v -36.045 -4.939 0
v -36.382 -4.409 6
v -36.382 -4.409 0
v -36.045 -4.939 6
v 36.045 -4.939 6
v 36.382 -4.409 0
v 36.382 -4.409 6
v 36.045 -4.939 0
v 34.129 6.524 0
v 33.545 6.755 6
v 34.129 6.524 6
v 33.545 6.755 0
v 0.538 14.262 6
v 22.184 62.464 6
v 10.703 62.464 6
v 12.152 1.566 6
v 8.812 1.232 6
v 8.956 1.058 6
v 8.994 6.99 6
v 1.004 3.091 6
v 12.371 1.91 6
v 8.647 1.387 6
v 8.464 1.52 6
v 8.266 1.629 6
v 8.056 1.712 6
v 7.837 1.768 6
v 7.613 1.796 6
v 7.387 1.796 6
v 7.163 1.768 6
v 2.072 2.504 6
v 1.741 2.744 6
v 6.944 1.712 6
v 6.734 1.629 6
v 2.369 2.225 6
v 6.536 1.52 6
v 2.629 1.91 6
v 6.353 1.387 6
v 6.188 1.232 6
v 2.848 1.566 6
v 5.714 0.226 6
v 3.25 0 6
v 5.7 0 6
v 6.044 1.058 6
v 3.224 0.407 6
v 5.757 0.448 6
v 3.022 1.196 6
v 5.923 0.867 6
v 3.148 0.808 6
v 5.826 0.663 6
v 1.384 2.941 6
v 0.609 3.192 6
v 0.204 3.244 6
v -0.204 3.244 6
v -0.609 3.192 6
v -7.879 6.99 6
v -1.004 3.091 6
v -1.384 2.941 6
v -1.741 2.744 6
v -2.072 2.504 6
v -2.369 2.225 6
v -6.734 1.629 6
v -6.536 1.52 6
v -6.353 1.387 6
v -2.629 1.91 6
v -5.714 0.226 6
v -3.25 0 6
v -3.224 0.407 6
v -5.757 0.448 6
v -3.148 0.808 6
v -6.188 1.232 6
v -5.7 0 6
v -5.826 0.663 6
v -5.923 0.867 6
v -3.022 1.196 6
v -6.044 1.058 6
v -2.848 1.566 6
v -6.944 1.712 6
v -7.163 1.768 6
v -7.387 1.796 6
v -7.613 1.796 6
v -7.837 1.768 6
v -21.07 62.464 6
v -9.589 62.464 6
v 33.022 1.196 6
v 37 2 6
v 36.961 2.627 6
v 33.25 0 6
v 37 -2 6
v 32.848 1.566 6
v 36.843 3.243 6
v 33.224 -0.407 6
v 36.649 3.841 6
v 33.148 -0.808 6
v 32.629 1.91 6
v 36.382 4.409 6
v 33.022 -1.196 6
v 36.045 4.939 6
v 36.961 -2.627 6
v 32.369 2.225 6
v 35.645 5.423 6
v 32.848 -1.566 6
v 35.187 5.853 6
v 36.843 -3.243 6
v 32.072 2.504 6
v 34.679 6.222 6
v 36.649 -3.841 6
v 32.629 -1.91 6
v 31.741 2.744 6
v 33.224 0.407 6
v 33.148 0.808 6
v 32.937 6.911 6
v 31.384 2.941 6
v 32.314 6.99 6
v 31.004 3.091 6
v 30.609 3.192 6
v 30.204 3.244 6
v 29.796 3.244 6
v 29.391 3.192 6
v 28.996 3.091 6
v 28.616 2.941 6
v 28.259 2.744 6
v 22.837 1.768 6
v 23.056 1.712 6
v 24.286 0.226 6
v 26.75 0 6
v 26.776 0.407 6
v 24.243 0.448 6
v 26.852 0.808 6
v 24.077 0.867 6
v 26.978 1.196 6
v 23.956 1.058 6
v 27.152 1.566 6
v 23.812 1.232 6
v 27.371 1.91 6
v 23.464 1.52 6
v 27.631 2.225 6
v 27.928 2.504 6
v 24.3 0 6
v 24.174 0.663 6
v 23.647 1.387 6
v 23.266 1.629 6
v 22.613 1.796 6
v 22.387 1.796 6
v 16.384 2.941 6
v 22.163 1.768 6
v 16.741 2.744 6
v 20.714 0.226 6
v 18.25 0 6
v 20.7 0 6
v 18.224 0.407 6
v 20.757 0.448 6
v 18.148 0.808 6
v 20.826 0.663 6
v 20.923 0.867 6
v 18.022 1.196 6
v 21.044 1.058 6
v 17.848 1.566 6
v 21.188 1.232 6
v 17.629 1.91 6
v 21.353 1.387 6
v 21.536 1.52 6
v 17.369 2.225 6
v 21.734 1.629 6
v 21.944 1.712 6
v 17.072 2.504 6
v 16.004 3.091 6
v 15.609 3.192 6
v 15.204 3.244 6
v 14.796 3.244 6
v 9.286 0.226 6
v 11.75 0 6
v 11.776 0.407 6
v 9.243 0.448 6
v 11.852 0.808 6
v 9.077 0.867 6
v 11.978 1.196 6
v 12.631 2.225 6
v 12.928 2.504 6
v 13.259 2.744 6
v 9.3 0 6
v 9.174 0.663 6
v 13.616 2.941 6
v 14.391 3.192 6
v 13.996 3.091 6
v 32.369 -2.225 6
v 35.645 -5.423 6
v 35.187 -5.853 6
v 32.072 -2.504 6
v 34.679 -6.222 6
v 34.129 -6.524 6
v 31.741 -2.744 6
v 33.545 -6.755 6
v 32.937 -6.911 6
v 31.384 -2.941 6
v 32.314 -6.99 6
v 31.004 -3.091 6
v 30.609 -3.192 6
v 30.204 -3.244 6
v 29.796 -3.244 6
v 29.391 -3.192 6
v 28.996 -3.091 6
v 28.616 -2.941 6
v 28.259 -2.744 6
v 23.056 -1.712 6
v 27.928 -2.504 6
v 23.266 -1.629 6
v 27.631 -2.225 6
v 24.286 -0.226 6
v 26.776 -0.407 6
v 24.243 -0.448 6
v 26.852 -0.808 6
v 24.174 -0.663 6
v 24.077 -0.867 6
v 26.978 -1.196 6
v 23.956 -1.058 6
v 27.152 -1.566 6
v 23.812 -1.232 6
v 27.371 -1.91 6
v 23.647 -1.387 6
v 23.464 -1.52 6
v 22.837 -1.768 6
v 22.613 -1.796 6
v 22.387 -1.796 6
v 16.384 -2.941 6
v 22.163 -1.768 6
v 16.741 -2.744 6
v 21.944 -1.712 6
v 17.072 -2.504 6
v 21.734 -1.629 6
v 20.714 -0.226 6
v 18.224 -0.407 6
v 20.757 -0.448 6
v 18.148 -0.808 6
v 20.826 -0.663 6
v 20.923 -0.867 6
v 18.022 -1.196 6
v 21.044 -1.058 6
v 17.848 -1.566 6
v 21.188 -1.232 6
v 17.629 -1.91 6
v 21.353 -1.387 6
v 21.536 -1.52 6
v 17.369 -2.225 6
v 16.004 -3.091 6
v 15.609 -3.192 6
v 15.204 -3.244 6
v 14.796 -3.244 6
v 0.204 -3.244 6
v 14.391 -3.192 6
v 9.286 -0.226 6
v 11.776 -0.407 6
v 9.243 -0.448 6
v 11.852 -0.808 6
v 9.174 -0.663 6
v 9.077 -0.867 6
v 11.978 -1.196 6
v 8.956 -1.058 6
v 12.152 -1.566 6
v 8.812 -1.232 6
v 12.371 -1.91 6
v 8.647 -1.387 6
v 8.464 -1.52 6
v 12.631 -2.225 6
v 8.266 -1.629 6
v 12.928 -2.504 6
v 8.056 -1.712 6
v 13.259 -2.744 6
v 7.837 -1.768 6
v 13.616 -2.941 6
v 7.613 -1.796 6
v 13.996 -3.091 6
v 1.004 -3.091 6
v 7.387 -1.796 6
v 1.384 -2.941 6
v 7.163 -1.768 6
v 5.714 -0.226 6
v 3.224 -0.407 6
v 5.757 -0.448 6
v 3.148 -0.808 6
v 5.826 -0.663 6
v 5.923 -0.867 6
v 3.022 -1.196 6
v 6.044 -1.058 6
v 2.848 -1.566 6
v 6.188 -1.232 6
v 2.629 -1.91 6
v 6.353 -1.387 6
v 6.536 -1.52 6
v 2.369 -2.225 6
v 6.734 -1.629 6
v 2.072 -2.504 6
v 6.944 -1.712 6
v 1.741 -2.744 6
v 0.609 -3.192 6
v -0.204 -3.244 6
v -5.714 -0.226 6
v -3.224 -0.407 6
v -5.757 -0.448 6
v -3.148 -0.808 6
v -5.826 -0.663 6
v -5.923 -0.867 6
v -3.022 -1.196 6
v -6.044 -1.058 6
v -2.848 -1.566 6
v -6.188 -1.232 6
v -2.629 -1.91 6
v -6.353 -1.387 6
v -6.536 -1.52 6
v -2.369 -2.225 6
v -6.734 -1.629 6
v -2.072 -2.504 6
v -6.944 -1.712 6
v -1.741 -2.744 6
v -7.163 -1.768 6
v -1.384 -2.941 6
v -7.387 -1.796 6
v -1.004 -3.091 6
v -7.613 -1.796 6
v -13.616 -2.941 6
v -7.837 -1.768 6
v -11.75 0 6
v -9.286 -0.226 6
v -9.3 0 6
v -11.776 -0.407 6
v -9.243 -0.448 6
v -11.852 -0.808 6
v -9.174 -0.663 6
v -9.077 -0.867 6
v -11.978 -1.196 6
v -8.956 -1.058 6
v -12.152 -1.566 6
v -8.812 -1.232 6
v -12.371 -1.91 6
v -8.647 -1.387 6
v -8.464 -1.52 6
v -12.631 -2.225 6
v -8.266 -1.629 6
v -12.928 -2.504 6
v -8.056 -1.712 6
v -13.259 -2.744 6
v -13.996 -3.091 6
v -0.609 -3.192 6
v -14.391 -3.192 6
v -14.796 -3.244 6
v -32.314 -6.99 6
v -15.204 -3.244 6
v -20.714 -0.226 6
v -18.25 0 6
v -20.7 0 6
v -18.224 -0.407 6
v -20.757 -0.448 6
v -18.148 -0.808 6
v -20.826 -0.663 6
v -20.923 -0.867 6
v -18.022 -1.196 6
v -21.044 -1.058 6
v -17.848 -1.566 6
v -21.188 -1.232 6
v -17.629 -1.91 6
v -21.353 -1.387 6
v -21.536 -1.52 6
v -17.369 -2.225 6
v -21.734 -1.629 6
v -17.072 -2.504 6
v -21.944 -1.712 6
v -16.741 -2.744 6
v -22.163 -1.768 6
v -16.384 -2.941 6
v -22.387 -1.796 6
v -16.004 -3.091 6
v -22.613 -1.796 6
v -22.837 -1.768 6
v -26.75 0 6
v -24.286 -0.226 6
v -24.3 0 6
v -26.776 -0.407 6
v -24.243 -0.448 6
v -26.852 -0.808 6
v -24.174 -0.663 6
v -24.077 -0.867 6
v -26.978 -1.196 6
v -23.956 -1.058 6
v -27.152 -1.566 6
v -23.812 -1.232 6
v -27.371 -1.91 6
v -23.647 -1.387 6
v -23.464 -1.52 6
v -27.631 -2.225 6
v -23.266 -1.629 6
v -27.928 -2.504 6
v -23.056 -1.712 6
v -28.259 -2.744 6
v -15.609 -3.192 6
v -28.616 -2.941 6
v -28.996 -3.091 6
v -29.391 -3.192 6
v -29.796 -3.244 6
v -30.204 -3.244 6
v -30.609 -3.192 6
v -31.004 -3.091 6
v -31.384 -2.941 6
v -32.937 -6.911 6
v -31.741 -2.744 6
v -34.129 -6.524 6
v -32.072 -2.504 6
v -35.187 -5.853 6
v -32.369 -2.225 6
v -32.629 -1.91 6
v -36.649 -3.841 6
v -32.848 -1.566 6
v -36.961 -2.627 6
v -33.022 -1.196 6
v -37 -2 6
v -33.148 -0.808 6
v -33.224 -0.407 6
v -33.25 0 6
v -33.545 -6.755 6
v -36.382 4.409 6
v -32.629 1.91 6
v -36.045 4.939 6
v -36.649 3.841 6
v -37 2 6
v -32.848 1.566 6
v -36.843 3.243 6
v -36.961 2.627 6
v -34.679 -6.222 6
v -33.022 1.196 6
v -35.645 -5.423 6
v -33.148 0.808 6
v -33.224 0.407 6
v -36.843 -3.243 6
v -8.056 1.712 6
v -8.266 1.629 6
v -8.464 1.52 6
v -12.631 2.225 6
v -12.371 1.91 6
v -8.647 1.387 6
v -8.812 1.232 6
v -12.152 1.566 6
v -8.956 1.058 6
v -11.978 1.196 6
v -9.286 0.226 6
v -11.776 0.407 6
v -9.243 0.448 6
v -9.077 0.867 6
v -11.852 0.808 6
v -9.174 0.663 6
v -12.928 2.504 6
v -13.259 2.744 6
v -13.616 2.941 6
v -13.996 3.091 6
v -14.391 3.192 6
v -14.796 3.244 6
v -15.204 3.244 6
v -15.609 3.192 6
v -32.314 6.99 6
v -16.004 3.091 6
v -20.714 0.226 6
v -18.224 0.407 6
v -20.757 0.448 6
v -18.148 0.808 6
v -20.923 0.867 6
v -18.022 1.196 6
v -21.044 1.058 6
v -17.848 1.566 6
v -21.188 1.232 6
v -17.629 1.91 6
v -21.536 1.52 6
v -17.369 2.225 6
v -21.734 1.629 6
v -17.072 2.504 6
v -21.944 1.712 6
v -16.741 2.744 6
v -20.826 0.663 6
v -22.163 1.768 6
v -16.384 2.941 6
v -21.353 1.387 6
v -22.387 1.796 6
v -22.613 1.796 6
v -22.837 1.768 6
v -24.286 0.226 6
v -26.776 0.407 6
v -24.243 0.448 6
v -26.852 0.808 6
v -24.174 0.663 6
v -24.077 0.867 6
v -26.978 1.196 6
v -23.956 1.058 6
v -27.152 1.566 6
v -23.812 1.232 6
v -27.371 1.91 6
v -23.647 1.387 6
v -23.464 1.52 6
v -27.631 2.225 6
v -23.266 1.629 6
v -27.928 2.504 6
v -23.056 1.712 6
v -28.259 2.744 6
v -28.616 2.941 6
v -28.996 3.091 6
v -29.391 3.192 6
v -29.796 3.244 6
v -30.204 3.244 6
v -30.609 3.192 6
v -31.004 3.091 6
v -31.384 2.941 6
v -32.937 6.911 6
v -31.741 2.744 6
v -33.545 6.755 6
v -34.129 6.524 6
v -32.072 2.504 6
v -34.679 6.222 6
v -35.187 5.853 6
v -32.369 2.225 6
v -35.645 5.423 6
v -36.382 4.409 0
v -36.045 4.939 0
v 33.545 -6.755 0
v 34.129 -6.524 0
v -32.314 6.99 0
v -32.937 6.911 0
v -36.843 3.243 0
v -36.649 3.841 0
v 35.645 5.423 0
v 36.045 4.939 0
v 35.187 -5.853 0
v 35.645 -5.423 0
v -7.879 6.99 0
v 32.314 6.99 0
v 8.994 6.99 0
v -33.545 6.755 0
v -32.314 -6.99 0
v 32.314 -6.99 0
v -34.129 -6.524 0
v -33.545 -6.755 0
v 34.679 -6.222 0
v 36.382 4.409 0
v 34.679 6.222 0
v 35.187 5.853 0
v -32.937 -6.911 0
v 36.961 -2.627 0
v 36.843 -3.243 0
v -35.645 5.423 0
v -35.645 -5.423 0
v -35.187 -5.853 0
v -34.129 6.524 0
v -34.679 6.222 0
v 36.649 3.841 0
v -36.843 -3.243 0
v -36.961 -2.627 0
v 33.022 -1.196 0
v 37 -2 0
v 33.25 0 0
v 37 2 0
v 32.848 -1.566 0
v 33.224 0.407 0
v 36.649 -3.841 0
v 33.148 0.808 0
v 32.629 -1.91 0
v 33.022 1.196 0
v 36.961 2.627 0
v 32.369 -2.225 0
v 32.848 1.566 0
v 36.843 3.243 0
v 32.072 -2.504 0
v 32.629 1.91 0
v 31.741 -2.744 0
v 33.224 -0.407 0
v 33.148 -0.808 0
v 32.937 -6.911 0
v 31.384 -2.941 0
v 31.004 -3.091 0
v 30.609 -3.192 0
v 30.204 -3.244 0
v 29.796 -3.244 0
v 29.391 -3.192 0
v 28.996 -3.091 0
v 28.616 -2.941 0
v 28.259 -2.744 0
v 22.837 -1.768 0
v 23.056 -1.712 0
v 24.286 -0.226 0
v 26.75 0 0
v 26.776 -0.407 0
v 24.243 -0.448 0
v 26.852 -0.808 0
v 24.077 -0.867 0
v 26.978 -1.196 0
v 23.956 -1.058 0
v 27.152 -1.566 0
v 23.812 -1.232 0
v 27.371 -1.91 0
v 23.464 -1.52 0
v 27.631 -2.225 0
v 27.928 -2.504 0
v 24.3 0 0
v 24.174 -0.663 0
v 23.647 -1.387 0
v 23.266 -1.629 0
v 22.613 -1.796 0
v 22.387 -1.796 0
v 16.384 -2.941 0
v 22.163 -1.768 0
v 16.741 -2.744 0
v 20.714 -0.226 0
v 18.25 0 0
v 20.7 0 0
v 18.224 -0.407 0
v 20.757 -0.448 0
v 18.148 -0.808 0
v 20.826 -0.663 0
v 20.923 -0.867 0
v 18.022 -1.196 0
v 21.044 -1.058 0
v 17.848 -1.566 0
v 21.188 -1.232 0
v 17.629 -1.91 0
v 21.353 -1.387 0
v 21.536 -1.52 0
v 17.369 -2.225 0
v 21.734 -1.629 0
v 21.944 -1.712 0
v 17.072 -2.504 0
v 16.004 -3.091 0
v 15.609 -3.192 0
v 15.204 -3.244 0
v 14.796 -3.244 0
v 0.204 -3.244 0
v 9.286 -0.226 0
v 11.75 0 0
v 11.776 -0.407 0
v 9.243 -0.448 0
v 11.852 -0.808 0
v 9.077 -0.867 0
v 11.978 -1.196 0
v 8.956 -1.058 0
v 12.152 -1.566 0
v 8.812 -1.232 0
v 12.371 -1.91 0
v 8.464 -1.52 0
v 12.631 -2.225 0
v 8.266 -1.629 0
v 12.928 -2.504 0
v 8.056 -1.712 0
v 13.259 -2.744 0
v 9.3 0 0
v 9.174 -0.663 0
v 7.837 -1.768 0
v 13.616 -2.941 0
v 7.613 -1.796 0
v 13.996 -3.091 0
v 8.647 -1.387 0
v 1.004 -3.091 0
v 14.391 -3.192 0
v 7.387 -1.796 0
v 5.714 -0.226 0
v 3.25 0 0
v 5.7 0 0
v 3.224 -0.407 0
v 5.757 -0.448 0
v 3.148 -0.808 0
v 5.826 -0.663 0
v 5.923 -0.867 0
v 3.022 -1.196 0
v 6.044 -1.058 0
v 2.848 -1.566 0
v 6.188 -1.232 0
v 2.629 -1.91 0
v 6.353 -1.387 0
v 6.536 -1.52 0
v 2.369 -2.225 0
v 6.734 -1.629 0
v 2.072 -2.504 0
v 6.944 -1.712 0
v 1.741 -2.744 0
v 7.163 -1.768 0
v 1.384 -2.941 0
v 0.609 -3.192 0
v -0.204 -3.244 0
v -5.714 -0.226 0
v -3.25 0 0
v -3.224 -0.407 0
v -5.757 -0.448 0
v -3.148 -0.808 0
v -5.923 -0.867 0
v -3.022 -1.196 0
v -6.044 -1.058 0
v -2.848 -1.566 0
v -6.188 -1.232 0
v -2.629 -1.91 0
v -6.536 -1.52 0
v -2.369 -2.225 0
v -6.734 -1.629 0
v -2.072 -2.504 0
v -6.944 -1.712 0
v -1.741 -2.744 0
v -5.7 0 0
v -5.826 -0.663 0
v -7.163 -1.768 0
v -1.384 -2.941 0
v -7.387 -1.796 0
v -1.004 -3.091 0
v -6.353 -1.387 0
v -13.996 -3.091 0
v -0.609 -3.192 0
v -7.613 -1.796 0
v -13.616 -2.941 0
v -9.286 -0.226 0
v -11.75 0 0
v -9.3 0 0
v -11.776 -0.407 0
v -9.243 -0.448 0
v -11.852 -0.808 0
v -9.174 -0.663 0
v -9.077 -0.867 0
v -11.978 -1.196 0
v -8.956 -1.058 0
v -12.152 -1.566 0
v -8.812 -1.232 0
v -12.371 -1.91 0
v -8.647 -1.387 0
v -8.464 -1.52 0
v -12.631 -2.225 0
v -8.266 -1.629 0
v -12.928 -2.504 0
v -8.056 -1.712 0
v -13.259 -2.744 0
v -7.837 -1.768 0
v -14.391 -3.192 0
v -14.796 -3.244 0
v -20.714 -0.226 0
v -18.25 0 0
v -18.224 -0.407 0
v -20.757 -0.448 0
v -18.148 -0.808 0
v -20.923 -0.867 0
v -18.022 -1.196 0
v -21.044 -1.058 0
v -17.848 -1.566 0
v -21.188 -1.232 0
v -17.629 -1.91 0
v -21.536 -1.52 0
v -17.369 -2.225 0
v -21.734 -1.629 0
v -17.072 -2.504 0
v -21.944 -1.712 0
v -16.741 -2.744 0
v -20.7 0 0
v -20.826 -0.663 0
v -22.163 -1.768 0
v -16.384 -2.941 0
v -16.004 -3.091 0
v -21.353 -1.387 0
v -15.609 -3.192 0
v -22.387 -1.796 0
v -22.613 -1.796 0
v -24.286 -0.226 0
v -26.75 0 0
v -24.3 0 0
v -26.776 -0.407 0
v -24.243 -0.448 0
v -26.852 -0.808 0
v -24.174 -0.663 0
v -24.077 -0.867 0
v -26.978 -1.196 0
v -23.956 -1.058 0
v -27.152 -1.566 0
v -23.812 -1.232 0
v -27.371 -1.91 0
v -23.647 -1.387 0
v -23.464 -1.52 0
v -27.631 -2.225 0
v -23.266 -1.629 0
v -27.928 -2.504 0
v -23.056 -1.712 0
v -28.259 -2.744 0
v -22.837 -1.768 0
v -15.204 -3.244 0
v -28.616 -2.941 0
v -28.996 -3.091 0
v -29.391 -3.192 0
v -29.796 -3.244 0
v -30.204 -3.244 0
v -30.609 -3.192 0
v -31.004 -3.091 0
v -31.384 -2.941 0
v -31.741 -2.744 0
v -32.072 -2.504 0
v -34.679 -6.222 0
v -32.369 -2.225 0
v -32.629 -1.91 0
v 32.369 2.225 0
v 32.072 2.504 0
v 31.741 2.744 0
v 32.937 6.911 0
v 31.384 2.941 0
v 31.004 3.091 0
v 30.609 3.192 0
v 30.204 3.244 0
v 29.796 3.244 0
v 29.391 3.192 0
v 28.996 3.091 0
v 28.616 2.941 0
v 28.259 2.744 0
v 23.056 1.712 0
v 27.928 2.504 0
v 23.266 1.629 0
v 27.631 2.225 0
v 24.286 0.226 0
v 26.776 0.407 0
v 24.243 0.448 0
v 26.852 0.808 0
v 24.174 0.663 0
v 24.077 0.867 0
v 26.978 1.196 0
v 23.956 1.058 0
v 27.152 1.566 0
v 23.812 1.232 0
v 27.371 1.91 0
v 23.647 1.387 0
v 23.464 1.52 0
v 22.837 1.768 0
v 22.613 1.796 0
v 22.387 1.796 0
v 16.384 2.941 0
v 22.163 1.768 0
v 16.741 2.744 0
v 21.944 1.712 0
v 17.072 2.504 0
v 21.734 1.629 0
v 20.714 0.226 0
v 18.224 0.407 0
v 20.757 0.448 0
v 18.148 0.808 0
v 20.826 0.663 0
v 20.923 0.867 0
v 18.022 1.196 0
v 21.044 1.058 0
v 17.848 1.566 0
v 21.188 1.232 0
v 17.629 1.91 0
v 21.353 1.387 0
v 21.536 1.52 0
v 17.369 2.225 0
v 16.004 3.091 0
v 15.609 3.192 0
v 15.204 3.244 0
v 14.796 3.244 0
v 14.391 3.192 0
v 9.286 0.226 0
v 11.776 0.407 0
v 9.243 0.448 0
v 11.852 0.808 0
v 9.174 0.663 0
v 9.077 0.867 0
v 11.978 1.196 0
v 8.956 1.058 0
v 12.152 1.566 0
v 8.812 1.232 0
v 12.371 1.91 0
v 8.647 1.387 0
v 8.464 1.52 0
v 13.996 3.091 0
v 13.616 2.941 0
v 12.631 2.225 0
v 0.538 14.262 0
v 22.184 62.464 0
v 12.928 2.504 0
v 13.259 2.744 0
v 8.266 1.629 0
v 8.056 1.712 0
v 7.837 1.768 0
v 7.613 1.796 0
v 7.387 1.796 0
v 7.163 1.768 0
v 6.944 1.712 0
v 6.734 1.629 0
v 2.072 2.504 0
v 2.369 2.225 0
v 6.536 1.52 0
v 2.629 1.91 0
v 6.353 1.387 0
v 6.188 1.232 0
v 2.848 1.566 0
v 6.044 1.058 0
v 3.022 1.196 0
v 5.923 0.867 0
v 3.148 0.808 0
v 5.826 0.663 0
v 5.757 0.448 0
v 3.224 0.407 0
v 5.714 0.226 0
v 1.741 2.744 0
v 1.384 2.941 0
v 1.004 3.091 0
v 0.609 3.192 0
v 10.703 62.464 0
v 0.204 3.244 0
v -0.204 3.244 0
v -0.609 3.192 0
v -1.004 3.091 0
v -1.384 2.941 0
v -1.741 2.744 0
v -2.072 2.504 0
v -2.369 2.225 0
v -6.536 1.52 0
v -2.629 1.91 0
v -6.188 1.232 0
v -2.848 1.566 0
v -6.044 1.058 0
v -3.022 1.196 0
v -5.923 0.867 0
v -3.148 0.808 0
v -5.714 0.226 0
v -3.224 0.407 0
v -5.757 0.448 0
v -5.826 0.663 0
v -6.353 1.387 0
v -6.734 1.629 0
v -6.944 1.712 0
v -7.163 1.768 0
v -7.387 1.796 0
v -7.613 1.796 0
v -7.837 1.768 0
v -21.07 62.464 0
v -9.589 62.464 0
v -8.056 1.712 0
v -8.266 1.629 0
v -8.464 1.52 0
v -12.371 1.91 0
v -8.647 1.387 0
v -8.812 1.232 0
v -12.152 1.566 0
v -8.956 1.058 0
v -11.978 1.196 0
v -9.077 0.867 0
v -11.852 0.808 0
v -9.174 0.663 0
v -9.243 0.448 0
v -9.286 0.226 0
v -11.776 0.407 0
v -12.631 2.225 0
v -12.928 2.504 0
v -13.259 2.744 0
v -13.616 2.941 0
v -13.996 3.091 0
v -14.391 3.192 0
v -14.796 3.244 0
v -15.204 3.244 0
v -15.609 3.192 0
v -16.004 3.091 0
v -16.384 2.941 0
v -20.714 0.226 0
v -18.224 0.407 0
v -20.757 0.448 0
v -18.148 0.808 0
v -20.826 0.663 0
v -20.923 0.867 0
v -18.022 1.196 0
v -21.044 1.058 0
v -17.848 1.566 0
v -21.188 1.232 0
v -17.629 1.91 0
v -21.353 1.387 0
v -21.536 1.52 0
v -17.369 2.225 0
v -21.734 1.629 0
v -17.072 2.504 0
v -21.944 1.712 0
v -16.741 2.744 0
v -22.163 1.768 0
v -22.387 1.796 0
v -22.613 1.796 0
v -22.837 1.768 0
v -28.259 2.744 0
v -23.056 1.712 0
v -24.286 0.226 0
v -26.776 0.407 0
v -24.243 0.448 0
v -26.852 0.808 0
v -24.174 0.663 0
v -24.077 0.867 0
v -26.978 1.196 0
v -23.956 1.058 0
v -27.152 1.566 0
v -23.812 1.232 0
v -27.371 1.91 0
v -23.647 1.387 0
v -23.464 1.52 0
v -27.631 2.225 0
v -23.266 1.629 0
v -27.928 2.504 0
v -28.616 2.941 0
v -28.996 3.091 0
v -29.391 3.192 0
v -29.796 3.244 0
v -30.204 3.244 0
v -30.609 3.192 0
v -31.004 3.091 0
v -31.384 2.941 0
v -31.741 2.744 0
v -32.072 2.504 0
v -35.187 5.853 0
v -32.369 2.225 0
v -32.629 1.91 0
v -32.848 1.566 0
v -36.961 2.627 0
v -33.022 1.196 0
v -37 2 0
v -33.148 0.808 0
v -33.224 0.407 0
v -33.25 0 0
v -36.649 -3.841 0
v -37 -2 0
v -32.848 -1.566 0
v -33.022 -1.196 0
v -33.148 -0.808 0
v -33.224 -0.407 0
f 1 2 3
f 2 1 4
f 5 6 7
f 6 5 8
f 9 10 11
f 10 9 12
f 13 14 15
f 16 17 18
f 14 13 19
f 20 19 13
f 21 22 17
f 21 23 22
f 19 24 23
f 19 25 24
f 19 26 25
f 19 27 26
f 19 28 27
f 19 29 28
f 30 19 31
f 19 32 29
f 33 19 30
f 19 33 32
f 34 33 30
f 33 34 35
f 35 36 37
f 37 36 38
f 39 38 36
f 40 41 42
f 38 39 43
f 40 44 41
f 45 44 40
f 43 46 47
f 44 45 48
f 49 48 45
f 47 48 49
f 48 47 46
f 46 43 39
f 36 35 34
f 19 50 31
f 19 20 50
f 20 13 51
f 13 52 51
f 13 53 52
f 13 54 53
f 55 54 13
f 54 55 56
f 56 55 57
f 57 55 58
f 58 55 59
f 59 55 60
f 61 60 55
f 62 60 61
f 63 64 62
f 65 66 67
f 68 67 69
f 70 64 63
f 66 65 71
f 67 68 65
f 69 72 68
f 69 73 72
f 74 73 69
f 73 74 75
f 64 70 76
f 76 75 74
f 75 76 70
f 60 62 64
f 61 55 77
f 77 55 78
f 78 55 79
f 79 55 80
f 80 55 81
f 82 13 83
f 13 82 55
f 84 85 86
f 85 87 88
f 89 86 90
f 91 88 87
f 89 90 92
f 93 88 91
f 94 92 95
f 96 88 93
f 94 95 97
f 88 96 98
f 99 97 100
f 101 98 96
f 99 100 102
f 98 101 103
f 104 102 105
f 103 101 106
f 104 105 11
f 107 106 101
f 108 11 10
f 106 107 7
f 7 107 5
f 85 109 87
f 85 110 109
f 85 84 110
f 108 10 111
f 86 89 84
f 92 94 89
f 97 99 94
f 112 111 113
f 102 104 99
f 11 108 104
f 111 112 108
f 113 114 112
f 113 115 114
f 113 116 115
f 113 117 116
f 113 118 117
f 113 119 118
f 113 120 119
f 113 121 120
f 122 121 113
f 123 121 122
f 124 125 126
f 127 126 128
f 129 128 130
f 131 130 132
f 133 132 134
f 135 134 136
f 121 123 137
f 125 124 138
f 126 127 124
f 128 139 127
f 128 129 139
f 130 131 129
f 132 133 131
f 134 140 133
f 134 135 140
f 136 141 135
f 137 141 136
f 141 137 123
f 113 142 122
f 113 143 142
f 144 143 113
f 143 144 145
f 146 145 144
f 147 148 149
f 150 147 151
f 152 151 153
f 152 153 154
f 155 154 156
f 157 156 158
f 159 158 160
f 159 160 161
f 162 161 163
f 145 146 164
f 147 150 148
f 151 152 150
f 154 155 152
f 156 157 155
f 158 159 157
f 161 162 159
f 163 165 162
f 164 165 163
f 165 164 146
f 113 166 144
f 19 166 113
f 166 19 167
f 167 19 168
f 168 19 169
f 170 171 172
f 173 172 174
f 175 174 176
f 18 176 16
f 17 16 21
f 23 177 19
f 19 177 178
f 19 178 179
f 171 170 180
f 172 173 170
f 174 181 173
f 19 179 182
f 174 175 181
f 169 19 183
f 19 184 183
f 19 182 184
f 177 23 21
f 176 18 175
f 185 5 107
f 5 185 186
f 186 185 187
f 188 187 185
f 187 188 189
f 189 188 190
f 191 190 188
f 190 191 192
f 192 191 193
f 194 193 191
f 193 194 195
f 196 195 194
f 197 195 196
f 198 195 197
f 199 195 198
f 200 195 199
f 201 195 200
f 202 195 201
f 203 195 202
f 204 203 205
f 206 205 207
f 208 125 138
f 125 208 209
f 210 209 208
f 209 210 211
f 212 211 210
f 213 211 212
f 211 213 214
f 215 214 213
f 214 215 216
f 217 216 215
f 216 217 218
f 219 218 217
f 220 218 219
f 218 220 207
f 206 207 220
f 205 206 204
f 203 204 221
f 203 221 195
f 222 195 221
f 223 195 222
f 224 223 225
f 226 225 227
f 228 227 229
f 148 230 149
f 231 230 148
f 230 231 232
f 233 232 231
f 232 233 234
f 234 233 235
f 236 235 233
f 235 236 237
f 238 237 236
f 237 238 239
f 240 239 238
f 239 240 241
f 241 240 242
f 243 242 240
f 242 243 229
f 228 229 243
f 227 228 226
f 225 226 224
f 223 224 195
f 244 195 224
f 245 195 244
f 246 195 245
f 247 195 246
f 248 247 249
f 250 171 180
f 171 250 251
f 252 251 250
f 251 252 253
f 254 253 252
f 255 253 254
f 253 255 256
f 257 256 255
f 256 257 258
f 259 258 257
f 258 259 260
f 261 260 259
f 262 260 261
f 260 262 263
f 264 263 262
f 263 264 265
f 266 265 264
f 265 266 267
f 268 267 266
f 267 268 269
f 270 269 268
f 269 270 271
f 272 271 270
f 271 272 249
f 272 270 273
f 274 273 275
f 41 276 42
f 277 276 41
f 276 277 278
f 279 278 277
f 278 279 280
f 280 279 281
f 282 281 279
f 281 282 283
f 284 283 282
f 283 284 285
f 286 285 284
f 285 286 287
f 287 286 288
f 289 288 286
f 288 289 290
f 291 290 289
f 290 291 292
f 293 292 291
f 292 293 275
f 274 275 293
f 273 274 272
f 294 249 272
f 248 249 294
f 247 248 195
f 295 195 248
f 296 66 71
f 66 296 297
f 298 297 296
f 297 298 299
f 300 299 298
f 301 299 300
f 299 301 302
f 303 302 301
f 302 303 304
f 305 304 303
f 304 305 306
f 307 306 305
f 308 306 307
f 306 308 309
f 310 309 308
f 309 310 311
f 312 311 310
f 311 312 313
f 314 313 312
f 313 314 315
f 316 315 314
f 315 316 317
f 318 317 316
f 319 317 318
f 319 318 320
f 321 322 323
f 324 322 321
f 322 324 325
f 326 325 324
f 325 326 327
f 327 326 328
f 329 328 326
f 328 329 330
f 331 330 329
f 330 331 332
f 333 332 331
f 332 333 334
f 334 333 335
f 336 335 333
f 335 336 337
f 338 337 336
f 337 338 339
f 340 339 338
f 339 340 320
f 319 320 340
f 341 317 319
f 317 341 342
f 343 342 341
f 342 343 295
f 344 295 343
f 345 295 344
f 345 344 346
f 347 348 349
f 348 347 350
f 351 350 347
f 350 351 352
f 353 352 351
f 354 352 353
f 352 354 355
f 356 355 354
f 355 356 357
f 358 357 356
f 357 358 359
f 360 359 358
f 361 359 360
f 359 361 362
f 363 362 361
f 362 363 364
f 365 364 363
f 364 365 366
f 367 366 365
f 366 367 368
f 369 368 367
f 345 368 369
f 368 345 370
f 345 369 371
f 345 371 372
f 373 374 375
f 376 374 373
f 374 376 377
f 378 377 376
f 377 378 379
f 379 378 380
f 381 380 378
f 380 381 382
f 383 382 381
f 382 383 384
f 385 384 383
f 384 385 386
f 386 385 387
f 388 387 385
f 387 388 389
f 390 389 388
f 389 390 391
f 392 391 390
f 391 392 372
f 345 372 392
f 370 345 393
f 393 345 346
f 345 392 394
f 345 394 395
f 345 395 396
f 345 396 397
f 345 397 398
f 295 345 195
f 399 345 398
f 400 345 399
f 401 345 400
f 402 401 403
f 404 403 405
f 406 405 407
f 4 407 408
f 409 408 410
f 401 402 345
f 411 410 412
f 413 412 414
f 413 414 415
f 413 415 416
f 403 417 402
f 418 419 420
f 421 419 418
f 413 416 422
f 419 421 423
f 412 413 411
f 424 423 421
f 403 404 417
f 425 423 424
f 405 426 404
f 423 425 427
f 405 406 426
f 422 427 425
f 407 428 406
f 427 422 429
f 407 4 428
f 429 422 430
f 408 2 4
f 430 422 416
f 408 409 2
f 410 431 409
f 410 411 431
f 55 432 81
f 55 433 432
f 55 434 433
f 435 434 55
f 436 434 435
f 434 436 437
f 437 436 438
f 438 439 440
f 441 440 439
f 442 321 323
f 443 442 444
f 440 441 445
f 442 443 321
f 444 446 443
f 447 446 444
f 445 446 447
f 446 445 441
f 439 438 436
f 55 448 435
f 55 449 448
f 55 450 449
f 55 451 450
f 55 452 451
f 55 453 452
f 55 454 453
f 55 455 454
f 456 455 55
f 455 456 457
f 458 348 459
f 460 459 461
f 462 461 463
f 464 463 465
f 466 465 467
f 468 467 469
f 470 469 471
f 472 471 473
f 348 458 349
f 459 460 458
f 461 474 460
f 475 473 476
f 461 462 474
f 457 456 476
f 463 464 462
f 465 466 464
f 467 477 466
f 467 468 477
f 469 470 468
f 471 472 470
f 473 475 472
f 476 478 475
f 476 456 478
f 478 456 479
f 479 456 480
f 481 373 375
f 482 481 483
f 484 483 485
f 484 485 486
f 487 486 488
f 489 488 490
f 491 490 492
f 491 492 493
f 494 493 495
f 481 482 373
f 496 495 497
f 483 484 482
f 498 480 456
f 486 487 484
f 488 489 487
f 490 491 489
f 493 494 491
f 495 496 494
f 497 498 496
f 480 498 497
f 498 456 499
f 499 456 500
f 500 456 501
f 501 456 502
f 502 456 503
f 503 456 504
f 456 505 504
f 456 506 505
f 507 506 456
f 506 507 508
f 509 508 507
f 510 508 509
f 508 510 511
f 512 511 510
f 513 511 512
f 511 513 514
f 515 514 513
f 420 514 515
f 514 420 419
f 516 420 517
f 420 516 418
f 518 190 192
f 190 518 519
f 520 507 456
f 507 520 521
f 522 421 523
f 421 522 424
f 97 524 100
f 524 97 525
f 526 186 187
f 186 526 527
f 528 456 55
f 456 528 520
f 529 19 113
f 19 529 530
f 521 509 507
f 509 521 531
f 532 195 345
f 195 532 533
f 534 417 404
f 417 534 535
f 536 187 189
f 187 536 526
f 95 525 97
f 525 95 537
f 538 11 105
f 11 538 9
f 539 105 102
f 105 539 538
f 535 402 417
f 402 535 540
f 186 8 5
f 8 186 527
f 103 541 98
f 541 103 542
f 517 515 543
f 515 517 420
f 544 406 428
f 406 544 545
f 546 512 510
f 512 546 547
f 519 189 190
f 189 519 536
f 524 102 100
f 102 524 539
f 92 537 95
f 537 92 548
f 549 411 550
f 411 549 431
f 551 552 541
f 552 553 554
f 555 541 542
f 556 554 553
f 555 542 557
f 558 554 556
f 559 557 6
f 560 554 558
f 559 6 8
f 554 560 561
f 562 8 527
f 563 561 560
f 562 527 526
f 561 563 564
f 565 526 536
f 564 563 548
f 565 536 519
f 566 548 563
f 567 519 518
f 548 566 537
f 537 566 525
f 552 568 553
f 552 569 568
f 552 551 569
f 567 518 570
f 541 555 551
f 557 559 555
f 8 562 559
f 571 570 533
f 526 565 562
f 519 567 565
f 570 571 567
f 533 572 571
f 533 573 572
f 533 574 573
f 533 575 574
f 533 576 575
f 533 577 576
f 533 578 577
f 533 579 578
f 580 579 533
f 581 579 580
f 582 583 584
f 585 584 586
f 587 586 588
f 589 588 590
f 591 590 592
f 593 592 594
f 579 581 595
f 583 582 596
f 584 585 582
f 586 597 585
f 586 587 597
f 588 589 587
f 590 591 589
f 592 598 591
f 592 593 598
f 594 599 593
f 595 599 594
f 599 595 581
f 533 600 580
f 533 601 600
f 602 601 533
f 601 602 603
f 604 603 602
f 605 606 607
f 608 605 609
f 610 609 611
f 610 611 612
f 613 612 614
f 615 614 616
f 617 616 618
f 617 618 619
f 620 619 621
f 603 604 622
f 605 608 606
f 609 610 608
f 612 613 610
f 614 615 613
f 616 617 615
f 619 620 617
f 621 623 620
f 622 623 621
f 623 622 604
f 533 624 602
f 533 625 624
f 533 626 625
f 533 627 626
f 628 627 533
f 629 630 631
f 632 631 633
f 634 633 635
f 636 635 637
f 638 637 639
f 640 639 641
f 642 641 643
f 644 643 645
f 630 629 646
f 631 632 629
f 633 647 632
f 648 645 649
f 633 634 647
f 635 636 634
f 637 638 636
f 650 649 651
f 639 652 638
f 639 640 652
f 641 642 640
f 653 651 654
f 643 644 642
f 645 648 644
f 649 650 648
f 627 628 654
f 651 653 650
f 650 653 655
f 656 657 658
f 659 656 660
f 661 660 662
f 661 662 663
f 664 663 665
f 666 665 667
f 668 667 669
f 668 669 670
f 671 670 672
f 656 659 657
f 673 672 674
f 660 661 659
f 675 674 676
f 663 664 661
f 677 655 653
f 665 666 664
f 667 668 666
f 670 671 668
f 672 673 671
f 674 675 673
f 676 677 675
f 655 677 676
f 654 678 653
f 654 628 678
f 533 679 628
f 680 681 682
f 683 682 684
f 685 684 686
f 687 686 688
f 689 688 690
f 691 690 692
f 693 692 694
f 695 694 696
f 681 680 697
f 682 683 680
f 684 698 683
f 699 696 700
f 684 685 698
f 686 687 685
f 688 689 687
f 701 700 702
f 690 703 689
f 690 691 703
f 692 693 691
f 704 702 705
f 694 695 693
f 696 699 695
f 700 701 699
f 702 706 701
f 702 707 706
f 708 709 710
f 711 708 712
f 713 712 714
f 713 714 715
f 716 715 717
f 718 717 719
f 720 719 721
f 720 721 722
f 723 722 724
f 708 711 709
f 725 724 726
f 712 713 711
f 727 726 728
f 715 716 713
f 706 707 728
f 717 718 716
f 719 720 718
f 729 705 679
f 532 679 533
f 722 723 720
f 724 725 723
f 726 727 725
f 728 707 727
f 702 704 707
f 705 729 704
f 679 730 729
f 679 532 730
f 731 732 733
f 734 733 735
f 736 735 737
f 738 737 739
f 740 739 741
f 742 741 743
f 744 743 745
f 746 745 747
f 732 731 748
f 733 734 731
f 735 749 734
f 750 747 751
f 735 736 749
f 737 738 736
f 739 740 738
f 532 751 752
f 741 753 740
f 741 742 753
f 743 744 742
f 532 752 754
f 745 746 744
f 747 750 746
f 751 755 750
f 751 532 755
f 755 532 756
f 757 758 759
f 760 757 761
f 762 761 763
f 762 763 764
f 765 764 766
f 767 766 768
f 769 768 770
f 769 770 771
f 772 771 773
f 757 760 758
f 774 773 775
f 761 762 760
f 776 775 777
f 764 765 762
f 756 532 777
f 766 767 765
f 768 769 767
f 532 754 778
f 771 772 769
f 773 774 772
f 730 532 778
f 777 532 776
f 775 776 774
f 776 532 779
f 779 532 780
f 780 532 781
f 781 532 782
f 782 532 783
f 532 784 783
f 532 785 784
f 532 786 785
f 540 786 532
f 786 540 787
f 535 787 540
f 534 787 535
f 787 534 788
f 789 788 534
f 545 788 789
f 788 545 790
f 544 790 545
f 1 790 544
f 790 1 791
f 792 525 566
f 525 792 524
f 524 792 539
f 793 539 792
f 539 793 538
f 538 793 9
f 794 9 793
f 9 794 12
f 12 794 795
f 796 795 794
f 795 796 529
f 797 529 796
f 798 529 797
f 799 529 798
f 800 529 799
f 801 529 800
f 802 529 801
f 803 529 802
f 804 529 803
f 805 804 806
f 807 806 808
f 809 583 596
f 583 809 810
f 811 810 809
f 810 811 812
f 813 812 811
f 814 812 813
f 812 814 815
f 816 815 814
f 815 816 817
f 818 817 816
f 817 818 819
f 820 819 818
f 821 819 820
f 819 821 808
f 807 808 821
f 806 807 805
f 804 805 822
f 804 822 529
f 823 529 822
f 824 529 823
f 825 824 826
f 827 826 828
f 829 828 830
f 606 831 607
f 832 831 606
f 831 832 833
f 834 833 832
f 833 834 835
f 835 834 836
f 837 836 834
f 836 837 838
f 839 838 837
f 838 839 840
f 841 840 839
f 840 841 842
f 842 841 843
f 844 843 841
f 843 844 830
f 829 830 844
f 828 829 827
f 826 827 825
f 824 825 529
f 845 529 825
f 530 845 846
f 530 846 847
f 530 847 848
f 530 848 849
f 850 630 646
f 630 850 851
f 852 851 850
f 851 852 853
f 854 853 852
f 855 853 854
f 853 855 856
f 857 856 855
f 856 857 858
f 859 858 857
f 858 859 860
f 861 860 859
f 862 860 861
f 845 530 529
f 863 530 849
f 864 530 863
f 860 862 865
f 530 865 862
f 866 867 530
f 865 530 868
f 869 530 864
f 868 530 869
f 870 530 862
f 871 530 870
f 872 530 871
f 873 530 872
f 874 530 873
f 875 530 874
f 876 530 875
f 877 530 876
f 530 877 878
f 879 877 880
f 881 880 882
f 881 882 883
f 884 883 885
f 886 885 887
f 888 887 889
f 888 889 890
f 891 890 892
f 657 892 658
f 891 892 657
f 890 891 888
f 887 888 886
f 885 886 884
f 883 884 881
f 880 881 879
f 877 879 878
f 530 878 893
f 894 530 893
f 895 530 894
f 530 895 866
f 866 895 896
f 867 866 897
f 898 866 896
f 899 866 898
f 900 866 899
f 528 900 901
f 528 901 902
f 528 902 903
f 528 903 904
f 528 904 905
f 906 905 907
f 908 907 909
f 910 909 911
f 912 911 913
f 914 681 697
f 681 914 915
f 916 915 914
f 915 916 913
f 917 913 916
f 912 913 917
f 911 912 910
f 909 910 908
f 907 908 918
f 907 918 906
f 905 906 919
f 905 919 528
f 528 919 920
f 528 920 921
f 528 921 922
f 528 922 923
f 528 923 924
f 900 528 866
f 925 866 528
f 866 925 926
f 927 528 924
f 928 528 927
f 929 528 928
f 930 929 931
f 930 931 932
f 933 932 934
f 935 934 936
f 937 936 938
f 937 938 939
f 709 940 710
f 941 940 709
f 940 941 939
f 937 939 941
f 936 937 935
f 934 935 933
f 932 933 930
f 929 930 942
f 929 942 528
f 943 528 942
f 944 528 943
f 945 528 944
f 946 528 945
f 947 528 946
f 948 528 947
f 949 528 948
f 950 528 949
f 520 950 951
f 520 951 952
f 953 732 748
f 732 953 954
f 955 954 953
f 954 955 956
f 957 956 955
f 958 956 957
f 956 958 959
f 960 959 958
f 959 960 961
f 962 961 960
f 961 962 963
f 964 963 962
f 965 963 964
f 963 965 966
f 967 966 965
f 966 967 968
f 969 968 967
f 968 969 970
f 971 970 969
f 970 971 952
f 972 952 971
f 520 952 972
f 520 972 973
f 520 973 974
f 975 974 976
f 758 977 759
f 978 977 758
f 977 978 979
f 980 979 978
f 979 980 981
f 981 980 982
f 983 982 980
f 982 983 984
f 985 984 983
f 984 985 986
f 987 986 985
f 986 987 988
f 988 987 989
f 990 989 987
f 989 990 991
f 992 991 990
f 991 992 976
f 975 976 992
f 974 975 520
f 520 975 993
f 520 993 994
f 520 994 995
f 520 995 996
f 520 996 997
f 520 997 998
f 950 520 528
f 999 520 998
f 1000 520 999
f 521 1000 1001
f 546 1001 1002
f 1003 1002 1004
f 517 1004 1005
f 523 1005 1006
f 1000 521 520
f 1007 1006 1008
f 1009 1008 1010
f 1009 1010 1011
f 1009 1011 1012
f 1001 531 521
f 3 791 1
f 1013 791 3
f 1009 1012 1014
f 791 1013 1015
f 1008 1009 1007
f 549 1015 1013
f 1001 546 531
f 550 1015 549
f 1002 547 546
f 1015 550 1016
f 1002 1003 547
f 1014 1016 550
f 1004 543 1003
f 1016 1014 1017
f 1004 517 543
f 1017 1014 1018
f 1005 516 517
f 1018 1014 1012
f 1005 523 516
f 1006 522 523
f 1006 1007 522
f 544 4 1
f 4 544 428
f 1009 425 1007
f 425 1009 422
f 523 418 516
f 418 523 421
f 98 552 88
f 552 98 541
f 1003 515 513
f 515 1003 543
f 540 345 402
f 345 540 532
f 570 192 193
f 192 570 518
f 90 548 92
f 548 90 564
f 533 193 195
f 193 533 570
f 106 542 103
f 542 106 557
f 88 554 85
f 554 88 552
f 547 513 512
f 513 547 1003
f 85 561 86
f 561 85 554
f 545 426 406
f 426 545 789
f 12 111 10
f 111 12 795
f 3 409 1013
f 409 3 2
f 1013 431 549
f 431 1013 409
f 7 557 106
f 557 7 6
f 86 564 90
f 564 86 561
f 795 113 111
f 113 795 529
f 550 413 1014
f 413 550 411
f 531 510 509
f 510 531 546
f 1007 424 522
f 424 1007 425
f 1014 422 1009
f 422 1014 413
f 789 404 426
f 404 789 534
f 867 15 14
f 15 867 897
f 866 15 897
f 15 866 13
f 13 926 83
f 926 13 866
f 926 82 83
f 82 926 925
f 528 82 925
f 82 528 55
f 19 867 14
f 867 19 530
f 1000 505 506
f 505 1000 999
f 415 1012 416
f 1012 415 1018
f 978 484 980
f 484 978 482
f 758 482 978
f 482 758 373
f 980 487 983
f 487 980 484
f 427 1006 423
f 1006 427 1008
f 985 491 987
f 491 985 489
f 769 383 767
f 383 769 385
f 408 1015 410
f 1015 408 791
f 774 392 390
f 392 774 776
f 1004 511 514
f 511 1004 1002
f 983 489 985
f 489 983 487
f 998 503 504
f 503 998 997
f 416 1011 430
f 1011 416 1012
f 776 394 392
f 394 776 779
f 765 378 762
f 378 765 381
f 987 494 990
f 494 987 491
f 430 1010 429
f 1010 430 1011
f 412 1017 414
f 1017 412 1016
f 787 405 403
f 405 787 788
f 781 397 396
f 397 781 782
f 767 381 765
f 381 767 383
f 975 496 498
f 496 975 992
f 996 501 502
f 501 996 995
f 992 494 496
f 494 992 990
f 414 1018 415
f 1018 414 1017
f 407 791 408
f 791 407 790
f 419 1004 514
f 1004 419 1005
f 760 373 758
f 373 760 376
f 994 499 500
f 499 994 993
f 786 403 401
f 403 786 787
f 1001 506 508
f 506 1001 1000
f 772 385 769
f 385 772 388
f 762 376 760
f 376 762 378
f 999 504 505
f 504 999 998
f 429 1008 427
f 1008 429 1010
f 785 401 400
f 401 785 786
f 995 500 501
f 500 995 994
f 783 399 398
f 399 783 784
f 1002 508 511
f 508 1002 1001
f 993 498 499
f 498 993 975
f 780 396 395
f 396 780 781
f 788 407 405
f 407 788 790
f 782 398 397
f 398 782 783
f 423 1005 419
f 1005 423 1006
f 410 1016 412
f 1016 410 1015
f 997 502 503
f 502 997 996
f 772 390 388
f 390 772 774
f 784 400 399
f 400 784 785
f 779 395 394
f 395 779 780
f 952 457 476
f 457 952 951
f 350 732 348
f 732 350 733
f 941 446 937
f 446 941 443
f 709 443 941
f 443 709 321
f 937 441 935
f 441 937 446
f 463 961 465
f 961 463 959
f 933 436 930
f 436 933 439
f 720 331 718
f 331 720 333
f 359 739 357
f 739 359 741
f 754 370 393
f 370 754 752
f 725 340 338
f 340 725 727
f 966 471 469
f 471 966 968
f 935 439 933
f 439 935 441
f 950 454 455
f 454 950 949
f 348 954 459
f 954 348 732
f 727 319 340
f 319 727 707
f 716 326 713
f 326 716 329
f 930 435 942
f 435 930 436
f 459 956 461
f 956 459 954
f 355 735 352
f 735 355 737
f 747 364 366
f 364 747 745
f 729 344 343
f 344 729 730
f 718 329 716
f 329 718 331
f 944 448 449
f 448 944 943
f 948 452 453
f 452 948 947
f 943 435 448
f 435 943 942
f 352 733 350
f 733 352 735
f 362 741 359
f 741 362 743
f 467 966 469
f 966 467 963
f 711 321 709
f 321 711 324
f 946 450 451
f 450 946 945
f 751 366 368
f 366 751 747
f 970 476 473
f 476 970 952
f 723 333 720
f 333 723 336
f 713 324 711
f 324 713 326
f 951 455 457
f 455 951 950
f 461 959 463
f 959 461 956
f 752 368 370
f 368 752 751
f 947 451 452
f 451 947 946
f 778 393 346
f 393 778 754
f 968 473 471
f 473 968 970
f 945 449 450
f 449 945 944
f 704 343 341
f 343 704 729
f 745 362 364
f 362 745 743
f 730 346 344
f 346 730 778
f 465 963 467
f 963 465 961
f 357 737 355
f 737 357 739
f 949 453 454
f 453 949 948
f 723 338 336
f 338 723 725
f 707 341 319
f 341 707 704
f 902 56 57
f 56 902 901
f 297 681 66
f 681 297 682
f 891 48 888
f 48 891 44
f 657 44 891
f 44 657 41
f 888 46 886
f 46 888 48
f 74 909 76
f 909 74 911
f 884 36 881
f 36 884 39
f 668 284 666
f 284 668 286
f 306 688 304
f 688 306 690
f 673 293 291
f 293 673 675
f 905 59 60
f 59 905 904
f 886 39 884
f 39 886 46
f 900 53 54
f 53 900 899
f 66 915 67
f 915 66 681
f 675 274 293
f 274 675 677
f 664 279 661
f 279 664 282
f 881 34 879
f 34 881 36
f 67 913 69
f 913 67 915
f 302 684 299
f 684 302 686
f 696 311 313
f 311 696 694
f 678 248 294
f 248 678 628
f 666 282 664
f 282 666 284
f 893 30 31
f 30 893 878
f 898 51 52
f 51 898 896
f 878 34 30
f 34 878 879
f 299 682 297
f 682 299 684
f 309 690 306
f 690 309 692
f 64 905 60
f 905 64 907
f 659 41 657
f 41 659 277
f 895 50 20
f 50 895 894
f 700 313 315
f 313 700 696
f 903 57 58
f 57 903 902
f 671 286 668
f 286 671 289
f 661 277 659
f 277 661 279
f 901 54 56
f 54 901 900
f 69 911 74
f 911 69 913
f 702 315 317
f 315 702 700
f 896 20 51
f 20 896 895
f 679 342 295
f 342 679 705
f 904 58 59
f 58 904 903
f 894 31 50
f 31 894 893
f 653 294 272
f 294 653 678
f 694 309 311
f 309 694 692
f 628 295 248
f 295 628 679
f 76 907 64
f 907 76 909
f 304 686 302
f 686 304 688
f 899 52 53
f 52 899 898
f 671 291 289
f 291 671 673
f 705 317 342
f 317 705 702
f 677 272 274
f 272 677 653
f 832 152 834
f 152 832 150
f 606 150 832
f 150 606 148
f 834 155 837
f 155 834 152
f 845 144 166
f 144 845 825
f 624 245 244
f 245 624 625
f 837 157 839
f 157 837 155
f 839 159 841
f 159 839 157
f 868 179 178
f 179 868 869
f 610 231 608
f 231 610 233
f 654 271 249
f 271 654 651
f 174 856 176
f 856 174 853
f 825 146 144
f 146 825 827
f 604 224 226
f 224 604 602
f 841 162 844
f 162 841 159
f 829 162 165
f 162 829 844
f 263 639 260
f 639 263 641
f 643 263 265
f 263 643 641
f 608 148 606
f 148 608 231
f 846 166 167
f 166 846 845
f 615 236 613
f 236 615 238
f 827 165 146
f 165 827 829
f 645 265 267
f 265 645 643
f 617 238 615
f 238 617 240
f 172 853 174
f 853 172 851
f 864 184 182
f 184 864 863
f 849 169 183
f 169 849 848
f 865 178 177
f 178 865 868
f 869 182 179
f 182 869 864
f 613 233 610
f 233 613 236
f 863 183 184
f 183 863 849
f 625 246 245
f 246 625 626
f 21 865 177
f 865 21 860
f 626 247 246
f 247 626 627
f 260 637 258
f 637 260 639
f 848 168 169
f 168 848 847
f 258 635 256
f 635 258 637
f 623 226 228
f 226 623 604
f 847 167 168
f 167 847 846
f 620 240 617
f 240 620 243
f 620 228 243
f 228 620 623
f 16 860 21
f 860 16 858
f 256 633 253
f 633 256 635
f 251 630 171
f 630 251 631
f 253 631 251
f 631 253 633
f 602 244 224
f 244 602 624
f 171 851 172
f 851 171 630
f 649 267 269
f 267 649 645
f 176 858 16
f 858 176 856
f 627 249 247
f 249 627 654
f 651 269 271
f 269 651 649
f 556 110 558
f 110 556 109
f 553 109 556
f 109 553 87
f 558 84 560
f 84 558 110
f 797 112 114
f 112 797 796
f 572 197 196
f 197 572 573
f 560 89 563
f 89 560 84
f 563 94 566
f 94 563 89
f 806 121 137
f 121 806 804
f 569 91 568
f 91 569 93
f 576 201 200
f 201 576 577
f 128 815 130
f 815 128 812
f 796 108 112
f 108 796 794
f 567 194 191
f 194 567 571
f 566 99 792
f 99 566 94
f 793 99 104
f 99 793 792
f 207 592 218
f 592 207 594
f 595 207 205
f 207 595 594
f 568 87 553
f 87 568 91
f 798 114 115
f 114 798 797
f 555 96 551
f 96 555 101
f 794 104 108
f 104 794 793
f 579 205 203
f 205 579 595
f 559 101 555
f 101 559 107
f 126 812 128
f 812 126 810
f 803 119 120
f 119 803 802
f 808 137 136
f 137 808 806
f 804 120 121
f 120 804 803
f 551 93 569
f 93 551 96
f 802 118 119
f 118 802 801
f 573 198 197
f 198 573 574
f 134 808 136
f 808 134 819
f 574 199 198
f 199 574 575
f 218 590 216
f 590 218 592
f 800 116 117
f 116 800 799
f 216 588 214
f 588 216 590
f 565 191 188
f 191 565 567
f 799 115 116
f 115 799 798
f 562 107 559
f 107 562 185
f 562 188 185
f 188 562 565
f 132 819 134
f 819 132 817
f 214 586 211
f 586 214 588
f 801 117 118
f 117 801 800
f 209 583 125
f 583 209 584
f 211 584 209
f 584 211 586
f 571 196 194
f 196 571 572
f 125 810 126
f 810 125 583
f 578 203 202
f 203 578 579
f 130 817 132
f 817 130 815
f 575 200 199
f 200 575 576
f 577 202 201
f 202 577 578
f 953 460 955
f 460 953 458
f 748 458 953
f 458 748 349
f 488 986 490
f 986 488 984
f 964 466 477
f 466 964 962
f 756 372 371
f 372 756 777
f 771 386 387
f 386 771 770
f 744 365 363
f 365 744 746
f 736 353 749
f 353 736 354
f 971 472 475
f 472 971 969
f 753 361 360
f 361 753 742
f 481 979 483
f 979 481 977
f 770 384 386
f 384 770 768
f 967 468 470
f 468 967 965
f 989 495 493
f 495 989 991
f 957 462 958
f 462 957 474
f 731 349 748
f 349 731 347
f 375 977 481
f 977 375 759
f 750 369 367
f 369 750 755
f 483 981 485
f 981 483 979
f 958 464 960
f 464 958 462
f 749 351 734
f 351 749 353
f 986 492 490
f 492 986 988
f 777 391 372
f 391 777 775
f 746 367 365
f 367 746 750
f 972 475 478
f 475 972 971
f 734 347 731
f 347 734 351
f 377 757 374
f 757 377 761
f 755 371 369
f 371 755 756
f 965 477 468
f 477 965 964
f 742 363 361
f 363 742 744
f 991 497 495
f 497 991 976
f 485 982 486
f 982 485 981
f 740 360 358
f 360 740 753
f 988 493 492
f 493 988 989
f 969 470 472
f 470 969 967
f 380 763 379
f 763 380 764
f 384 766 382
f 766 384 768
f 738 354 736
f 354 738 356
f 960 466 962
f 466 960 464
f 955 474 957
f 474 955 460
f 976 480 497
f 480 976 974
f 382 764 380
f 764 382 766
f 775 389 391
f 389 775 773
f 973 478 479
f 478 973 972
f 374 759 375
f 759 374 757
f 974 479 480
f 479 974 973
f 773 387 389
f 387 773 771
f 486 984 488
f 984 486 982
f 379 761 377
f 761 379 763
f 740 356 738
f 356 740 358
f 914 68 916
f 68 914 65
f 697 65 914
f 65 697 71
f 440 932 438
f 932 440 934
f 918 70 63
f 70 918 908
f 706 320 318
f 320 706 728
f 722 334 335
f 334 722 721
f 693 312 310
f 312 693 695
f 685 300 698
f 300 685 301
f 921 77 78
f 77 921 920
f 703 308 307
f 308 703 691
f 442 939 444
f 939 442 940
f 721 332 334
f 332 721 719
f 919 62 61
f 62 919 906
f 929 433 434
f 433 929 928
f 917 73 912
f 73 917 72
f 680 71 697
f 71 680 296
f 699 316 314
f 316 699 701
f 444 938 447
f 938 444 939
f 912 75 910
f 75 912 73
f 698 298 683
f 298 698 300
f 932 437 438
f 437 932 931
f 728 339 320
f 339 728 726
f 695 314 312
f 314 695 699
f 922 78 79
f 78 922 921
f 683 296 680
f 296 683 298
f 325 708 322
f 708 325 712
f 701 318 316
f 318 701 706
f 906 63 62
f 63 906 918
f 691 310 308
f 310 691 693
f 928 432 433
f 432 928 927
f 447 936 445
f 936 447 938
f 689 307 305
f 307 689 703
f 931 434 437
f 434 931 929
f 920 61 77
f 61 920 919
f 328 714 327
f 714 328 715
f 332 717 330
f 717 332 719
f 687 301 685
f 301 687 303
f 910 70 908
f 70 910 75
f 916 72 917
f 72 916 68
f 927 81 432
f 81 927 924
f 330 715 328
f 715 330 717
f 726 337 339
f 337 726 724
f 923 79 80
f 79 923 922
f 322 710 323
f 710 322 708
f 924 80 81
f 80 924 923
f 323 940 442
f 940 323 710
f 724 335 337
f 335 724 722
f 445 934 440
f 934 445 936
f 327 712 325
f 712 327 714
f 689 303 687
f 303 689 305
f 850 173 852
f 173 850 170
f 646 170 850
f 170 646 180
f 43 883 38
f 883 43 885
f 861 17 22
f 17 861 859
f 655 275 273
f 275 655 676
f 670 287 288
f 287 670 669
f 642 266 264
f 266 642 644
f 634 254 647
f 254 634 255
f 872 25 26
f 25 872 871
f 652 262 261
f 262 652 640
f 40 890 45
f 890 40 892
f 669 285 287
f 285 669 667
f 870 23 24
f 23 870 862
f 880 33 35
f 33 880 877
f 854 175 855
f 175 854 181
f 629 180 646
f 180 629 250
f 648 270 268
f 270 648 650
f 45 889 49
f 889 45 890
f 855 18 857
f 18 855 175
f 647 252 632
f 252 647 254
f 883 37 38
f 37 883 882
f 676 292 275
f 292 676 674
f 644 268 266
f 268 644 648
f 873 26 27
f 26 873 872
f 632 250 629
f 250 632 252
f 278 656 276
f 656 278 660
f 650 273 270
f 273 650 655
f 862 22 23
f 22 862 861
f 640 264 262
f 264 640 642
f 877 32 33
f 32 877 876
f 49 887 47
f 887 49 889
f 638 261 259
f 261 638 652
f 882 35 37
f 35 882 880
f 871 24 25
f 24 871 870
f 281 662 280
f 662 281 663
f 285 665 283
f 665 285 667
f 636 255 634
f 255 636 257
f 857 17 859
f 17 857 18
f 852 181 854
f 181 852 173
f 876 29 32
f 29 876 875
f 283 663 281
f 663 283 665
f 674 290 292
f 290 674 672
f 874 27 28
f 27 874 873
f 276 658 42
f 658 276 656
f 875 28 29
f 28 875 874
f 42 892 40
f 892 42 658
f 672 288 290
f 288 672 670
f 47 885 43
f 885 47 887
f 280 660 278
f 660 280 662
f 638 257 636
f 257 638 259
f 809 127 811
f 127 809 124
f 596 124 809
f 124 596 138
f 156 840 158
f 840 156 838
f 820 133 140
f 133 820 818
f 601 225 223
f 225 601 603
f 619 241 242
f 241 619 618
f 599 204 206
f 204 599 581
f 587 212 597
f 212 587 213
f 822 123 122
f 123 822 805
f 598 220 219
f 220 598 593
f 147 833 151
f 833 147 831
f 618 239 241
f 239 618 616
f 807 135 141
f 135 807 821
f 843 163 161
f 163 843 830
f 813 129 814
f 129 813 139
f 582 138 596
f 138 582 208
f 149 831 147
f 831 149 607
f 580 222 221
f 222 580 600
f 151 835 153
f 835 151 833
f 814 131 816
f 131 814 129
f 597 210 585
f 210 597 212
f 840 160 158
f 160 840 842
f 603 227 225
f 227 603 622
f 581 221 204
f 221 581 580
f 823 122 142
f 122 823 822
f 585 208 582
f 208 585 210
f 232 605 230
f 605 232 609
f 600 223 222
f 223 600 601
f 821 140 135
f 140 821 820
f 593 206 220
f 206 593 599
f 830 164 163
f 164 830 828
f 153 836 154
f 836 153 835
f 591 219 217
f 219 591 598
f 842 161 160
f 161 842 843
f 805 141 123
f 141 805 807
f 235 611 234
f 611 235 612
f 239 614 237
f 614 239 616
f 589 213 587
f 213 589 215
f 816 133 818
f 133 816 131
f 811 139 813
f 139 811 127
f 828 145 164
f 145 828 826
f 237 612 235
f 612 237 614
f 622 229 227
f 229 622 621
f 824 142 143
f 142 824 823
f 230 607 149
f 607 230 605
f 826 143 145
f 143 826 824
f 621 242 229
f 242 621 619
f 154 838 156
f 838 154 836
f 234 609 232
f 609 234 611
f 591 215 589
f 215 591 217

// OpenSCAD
$fn = 50;


difference() {
	union() {
		hull() {
			translate(v = [-32.0000000000, 2.0000000000, 0]) {
				cylinder(h = 6, r = 5);
			}
			translate(v = [32.0000000000, 2.0000000000, 0]) {
				cylinder(h = 6, r = 5);
			}
			translate(v = [-32.0000000000, -2.0000000000, 0]) {
				cylinder(h = 6, r = 5);
			}
			translate(v = [32.0000000000, -2.0000000000, 0]) {
				cylinder(h = 6, r = 5);
			}
		}
		translate(v = [0, 61.1111111111, 0]) {
			linear_extrude(height = 6) {
				text(font = "DejaVu Sans Mono:style=Bold", halign = "center", size = 57.0000000000, text = "V", valign = "top");
			}
		}
	}
	union() {
		translate(v = [-30.0000000000, 0.0000000000, 0]) {
			translate(v = [0, 0, -100]) {
				cylinder(h = 200, r = 3.2500000000);
			}
		}
		translate(v = [-15.0000000000, 0.0000000000, 0]) {
			translate(v = [0, 0, -100]) {
				cylinder(h = 200, r = 3.2500000000);
			}
		}
		translate(v = [0, 0, -100]) {
			cylinder(h = 200, r = 3.2500000000);
		}
		translate(v = [15.0000000000, 0.0000000000, 0]) {
			translate(v = [0, 0, -100]) {
				cylinder(h = 200, r = 3.2500000000);
			}
		}
		translate(v = [30.0000000000, 0.0000000000, 0]) {
			translate(v = [0, 0, -100]) {
				cylinder(h = 200, r = 3.2500000000);
			}
		}
		translate(v = [-30.0000000000, 0.0000000000, 0]) {
			translate(v = [0, 0, -100]) {
				cylinder(h = 200, r = 1.8000000000);
			}
		}
		translate(v = [-22.5000000000, 0.0000000000, 0]) {
			translate(v = [0, 0, -100]) {
				cylinder(h = 200, r = 1.8000000000);
			}
		}
		translate(v = [-15.0000000000, 0.0000000000, 0]) {
			translate(v = [0, 0, -100]) {
				cylinder(h = 200, r = 1.8000000000);
			}
		}
		translate(v = [-7.5000000000, 0.0000000000, 0]) {
			translate(v = [0, 0, -100]) {
				cylinder(h = 200, r = 1.8000000000);
			}
		}
		translate(v = [0, 0, -100]) {
			cylinder(h = 200, r = 1.8000000000);
		}
		translate(v = [7.5000000000, 0.0000000000, 0]) {
			translate(v = [0, 0, -100]) {
				cylinder(h = 200, r = 1.8000000000);
			}
		}
		translate(v = [15.0000000000, 0.0000000000, 0]) {
			translate(v = [0, 0, -100]) {
				cylinder(h = 200, r = 1.8000000000);
			}
		}
		translate(v = [22.5000000000, 0.0000000000, 0]) {
			translate(v = [0, 0, -100]) {
				cylinder(h = 200, r = 1.8000000000);
			}
		}
		translate(v = [30.0000000000, 0.0000000000, 0]) {
			translate(v = [0, 0, -100]) {
				cylinder(h = 200, r = 1.8000000000);
			}
		}
	}
}
